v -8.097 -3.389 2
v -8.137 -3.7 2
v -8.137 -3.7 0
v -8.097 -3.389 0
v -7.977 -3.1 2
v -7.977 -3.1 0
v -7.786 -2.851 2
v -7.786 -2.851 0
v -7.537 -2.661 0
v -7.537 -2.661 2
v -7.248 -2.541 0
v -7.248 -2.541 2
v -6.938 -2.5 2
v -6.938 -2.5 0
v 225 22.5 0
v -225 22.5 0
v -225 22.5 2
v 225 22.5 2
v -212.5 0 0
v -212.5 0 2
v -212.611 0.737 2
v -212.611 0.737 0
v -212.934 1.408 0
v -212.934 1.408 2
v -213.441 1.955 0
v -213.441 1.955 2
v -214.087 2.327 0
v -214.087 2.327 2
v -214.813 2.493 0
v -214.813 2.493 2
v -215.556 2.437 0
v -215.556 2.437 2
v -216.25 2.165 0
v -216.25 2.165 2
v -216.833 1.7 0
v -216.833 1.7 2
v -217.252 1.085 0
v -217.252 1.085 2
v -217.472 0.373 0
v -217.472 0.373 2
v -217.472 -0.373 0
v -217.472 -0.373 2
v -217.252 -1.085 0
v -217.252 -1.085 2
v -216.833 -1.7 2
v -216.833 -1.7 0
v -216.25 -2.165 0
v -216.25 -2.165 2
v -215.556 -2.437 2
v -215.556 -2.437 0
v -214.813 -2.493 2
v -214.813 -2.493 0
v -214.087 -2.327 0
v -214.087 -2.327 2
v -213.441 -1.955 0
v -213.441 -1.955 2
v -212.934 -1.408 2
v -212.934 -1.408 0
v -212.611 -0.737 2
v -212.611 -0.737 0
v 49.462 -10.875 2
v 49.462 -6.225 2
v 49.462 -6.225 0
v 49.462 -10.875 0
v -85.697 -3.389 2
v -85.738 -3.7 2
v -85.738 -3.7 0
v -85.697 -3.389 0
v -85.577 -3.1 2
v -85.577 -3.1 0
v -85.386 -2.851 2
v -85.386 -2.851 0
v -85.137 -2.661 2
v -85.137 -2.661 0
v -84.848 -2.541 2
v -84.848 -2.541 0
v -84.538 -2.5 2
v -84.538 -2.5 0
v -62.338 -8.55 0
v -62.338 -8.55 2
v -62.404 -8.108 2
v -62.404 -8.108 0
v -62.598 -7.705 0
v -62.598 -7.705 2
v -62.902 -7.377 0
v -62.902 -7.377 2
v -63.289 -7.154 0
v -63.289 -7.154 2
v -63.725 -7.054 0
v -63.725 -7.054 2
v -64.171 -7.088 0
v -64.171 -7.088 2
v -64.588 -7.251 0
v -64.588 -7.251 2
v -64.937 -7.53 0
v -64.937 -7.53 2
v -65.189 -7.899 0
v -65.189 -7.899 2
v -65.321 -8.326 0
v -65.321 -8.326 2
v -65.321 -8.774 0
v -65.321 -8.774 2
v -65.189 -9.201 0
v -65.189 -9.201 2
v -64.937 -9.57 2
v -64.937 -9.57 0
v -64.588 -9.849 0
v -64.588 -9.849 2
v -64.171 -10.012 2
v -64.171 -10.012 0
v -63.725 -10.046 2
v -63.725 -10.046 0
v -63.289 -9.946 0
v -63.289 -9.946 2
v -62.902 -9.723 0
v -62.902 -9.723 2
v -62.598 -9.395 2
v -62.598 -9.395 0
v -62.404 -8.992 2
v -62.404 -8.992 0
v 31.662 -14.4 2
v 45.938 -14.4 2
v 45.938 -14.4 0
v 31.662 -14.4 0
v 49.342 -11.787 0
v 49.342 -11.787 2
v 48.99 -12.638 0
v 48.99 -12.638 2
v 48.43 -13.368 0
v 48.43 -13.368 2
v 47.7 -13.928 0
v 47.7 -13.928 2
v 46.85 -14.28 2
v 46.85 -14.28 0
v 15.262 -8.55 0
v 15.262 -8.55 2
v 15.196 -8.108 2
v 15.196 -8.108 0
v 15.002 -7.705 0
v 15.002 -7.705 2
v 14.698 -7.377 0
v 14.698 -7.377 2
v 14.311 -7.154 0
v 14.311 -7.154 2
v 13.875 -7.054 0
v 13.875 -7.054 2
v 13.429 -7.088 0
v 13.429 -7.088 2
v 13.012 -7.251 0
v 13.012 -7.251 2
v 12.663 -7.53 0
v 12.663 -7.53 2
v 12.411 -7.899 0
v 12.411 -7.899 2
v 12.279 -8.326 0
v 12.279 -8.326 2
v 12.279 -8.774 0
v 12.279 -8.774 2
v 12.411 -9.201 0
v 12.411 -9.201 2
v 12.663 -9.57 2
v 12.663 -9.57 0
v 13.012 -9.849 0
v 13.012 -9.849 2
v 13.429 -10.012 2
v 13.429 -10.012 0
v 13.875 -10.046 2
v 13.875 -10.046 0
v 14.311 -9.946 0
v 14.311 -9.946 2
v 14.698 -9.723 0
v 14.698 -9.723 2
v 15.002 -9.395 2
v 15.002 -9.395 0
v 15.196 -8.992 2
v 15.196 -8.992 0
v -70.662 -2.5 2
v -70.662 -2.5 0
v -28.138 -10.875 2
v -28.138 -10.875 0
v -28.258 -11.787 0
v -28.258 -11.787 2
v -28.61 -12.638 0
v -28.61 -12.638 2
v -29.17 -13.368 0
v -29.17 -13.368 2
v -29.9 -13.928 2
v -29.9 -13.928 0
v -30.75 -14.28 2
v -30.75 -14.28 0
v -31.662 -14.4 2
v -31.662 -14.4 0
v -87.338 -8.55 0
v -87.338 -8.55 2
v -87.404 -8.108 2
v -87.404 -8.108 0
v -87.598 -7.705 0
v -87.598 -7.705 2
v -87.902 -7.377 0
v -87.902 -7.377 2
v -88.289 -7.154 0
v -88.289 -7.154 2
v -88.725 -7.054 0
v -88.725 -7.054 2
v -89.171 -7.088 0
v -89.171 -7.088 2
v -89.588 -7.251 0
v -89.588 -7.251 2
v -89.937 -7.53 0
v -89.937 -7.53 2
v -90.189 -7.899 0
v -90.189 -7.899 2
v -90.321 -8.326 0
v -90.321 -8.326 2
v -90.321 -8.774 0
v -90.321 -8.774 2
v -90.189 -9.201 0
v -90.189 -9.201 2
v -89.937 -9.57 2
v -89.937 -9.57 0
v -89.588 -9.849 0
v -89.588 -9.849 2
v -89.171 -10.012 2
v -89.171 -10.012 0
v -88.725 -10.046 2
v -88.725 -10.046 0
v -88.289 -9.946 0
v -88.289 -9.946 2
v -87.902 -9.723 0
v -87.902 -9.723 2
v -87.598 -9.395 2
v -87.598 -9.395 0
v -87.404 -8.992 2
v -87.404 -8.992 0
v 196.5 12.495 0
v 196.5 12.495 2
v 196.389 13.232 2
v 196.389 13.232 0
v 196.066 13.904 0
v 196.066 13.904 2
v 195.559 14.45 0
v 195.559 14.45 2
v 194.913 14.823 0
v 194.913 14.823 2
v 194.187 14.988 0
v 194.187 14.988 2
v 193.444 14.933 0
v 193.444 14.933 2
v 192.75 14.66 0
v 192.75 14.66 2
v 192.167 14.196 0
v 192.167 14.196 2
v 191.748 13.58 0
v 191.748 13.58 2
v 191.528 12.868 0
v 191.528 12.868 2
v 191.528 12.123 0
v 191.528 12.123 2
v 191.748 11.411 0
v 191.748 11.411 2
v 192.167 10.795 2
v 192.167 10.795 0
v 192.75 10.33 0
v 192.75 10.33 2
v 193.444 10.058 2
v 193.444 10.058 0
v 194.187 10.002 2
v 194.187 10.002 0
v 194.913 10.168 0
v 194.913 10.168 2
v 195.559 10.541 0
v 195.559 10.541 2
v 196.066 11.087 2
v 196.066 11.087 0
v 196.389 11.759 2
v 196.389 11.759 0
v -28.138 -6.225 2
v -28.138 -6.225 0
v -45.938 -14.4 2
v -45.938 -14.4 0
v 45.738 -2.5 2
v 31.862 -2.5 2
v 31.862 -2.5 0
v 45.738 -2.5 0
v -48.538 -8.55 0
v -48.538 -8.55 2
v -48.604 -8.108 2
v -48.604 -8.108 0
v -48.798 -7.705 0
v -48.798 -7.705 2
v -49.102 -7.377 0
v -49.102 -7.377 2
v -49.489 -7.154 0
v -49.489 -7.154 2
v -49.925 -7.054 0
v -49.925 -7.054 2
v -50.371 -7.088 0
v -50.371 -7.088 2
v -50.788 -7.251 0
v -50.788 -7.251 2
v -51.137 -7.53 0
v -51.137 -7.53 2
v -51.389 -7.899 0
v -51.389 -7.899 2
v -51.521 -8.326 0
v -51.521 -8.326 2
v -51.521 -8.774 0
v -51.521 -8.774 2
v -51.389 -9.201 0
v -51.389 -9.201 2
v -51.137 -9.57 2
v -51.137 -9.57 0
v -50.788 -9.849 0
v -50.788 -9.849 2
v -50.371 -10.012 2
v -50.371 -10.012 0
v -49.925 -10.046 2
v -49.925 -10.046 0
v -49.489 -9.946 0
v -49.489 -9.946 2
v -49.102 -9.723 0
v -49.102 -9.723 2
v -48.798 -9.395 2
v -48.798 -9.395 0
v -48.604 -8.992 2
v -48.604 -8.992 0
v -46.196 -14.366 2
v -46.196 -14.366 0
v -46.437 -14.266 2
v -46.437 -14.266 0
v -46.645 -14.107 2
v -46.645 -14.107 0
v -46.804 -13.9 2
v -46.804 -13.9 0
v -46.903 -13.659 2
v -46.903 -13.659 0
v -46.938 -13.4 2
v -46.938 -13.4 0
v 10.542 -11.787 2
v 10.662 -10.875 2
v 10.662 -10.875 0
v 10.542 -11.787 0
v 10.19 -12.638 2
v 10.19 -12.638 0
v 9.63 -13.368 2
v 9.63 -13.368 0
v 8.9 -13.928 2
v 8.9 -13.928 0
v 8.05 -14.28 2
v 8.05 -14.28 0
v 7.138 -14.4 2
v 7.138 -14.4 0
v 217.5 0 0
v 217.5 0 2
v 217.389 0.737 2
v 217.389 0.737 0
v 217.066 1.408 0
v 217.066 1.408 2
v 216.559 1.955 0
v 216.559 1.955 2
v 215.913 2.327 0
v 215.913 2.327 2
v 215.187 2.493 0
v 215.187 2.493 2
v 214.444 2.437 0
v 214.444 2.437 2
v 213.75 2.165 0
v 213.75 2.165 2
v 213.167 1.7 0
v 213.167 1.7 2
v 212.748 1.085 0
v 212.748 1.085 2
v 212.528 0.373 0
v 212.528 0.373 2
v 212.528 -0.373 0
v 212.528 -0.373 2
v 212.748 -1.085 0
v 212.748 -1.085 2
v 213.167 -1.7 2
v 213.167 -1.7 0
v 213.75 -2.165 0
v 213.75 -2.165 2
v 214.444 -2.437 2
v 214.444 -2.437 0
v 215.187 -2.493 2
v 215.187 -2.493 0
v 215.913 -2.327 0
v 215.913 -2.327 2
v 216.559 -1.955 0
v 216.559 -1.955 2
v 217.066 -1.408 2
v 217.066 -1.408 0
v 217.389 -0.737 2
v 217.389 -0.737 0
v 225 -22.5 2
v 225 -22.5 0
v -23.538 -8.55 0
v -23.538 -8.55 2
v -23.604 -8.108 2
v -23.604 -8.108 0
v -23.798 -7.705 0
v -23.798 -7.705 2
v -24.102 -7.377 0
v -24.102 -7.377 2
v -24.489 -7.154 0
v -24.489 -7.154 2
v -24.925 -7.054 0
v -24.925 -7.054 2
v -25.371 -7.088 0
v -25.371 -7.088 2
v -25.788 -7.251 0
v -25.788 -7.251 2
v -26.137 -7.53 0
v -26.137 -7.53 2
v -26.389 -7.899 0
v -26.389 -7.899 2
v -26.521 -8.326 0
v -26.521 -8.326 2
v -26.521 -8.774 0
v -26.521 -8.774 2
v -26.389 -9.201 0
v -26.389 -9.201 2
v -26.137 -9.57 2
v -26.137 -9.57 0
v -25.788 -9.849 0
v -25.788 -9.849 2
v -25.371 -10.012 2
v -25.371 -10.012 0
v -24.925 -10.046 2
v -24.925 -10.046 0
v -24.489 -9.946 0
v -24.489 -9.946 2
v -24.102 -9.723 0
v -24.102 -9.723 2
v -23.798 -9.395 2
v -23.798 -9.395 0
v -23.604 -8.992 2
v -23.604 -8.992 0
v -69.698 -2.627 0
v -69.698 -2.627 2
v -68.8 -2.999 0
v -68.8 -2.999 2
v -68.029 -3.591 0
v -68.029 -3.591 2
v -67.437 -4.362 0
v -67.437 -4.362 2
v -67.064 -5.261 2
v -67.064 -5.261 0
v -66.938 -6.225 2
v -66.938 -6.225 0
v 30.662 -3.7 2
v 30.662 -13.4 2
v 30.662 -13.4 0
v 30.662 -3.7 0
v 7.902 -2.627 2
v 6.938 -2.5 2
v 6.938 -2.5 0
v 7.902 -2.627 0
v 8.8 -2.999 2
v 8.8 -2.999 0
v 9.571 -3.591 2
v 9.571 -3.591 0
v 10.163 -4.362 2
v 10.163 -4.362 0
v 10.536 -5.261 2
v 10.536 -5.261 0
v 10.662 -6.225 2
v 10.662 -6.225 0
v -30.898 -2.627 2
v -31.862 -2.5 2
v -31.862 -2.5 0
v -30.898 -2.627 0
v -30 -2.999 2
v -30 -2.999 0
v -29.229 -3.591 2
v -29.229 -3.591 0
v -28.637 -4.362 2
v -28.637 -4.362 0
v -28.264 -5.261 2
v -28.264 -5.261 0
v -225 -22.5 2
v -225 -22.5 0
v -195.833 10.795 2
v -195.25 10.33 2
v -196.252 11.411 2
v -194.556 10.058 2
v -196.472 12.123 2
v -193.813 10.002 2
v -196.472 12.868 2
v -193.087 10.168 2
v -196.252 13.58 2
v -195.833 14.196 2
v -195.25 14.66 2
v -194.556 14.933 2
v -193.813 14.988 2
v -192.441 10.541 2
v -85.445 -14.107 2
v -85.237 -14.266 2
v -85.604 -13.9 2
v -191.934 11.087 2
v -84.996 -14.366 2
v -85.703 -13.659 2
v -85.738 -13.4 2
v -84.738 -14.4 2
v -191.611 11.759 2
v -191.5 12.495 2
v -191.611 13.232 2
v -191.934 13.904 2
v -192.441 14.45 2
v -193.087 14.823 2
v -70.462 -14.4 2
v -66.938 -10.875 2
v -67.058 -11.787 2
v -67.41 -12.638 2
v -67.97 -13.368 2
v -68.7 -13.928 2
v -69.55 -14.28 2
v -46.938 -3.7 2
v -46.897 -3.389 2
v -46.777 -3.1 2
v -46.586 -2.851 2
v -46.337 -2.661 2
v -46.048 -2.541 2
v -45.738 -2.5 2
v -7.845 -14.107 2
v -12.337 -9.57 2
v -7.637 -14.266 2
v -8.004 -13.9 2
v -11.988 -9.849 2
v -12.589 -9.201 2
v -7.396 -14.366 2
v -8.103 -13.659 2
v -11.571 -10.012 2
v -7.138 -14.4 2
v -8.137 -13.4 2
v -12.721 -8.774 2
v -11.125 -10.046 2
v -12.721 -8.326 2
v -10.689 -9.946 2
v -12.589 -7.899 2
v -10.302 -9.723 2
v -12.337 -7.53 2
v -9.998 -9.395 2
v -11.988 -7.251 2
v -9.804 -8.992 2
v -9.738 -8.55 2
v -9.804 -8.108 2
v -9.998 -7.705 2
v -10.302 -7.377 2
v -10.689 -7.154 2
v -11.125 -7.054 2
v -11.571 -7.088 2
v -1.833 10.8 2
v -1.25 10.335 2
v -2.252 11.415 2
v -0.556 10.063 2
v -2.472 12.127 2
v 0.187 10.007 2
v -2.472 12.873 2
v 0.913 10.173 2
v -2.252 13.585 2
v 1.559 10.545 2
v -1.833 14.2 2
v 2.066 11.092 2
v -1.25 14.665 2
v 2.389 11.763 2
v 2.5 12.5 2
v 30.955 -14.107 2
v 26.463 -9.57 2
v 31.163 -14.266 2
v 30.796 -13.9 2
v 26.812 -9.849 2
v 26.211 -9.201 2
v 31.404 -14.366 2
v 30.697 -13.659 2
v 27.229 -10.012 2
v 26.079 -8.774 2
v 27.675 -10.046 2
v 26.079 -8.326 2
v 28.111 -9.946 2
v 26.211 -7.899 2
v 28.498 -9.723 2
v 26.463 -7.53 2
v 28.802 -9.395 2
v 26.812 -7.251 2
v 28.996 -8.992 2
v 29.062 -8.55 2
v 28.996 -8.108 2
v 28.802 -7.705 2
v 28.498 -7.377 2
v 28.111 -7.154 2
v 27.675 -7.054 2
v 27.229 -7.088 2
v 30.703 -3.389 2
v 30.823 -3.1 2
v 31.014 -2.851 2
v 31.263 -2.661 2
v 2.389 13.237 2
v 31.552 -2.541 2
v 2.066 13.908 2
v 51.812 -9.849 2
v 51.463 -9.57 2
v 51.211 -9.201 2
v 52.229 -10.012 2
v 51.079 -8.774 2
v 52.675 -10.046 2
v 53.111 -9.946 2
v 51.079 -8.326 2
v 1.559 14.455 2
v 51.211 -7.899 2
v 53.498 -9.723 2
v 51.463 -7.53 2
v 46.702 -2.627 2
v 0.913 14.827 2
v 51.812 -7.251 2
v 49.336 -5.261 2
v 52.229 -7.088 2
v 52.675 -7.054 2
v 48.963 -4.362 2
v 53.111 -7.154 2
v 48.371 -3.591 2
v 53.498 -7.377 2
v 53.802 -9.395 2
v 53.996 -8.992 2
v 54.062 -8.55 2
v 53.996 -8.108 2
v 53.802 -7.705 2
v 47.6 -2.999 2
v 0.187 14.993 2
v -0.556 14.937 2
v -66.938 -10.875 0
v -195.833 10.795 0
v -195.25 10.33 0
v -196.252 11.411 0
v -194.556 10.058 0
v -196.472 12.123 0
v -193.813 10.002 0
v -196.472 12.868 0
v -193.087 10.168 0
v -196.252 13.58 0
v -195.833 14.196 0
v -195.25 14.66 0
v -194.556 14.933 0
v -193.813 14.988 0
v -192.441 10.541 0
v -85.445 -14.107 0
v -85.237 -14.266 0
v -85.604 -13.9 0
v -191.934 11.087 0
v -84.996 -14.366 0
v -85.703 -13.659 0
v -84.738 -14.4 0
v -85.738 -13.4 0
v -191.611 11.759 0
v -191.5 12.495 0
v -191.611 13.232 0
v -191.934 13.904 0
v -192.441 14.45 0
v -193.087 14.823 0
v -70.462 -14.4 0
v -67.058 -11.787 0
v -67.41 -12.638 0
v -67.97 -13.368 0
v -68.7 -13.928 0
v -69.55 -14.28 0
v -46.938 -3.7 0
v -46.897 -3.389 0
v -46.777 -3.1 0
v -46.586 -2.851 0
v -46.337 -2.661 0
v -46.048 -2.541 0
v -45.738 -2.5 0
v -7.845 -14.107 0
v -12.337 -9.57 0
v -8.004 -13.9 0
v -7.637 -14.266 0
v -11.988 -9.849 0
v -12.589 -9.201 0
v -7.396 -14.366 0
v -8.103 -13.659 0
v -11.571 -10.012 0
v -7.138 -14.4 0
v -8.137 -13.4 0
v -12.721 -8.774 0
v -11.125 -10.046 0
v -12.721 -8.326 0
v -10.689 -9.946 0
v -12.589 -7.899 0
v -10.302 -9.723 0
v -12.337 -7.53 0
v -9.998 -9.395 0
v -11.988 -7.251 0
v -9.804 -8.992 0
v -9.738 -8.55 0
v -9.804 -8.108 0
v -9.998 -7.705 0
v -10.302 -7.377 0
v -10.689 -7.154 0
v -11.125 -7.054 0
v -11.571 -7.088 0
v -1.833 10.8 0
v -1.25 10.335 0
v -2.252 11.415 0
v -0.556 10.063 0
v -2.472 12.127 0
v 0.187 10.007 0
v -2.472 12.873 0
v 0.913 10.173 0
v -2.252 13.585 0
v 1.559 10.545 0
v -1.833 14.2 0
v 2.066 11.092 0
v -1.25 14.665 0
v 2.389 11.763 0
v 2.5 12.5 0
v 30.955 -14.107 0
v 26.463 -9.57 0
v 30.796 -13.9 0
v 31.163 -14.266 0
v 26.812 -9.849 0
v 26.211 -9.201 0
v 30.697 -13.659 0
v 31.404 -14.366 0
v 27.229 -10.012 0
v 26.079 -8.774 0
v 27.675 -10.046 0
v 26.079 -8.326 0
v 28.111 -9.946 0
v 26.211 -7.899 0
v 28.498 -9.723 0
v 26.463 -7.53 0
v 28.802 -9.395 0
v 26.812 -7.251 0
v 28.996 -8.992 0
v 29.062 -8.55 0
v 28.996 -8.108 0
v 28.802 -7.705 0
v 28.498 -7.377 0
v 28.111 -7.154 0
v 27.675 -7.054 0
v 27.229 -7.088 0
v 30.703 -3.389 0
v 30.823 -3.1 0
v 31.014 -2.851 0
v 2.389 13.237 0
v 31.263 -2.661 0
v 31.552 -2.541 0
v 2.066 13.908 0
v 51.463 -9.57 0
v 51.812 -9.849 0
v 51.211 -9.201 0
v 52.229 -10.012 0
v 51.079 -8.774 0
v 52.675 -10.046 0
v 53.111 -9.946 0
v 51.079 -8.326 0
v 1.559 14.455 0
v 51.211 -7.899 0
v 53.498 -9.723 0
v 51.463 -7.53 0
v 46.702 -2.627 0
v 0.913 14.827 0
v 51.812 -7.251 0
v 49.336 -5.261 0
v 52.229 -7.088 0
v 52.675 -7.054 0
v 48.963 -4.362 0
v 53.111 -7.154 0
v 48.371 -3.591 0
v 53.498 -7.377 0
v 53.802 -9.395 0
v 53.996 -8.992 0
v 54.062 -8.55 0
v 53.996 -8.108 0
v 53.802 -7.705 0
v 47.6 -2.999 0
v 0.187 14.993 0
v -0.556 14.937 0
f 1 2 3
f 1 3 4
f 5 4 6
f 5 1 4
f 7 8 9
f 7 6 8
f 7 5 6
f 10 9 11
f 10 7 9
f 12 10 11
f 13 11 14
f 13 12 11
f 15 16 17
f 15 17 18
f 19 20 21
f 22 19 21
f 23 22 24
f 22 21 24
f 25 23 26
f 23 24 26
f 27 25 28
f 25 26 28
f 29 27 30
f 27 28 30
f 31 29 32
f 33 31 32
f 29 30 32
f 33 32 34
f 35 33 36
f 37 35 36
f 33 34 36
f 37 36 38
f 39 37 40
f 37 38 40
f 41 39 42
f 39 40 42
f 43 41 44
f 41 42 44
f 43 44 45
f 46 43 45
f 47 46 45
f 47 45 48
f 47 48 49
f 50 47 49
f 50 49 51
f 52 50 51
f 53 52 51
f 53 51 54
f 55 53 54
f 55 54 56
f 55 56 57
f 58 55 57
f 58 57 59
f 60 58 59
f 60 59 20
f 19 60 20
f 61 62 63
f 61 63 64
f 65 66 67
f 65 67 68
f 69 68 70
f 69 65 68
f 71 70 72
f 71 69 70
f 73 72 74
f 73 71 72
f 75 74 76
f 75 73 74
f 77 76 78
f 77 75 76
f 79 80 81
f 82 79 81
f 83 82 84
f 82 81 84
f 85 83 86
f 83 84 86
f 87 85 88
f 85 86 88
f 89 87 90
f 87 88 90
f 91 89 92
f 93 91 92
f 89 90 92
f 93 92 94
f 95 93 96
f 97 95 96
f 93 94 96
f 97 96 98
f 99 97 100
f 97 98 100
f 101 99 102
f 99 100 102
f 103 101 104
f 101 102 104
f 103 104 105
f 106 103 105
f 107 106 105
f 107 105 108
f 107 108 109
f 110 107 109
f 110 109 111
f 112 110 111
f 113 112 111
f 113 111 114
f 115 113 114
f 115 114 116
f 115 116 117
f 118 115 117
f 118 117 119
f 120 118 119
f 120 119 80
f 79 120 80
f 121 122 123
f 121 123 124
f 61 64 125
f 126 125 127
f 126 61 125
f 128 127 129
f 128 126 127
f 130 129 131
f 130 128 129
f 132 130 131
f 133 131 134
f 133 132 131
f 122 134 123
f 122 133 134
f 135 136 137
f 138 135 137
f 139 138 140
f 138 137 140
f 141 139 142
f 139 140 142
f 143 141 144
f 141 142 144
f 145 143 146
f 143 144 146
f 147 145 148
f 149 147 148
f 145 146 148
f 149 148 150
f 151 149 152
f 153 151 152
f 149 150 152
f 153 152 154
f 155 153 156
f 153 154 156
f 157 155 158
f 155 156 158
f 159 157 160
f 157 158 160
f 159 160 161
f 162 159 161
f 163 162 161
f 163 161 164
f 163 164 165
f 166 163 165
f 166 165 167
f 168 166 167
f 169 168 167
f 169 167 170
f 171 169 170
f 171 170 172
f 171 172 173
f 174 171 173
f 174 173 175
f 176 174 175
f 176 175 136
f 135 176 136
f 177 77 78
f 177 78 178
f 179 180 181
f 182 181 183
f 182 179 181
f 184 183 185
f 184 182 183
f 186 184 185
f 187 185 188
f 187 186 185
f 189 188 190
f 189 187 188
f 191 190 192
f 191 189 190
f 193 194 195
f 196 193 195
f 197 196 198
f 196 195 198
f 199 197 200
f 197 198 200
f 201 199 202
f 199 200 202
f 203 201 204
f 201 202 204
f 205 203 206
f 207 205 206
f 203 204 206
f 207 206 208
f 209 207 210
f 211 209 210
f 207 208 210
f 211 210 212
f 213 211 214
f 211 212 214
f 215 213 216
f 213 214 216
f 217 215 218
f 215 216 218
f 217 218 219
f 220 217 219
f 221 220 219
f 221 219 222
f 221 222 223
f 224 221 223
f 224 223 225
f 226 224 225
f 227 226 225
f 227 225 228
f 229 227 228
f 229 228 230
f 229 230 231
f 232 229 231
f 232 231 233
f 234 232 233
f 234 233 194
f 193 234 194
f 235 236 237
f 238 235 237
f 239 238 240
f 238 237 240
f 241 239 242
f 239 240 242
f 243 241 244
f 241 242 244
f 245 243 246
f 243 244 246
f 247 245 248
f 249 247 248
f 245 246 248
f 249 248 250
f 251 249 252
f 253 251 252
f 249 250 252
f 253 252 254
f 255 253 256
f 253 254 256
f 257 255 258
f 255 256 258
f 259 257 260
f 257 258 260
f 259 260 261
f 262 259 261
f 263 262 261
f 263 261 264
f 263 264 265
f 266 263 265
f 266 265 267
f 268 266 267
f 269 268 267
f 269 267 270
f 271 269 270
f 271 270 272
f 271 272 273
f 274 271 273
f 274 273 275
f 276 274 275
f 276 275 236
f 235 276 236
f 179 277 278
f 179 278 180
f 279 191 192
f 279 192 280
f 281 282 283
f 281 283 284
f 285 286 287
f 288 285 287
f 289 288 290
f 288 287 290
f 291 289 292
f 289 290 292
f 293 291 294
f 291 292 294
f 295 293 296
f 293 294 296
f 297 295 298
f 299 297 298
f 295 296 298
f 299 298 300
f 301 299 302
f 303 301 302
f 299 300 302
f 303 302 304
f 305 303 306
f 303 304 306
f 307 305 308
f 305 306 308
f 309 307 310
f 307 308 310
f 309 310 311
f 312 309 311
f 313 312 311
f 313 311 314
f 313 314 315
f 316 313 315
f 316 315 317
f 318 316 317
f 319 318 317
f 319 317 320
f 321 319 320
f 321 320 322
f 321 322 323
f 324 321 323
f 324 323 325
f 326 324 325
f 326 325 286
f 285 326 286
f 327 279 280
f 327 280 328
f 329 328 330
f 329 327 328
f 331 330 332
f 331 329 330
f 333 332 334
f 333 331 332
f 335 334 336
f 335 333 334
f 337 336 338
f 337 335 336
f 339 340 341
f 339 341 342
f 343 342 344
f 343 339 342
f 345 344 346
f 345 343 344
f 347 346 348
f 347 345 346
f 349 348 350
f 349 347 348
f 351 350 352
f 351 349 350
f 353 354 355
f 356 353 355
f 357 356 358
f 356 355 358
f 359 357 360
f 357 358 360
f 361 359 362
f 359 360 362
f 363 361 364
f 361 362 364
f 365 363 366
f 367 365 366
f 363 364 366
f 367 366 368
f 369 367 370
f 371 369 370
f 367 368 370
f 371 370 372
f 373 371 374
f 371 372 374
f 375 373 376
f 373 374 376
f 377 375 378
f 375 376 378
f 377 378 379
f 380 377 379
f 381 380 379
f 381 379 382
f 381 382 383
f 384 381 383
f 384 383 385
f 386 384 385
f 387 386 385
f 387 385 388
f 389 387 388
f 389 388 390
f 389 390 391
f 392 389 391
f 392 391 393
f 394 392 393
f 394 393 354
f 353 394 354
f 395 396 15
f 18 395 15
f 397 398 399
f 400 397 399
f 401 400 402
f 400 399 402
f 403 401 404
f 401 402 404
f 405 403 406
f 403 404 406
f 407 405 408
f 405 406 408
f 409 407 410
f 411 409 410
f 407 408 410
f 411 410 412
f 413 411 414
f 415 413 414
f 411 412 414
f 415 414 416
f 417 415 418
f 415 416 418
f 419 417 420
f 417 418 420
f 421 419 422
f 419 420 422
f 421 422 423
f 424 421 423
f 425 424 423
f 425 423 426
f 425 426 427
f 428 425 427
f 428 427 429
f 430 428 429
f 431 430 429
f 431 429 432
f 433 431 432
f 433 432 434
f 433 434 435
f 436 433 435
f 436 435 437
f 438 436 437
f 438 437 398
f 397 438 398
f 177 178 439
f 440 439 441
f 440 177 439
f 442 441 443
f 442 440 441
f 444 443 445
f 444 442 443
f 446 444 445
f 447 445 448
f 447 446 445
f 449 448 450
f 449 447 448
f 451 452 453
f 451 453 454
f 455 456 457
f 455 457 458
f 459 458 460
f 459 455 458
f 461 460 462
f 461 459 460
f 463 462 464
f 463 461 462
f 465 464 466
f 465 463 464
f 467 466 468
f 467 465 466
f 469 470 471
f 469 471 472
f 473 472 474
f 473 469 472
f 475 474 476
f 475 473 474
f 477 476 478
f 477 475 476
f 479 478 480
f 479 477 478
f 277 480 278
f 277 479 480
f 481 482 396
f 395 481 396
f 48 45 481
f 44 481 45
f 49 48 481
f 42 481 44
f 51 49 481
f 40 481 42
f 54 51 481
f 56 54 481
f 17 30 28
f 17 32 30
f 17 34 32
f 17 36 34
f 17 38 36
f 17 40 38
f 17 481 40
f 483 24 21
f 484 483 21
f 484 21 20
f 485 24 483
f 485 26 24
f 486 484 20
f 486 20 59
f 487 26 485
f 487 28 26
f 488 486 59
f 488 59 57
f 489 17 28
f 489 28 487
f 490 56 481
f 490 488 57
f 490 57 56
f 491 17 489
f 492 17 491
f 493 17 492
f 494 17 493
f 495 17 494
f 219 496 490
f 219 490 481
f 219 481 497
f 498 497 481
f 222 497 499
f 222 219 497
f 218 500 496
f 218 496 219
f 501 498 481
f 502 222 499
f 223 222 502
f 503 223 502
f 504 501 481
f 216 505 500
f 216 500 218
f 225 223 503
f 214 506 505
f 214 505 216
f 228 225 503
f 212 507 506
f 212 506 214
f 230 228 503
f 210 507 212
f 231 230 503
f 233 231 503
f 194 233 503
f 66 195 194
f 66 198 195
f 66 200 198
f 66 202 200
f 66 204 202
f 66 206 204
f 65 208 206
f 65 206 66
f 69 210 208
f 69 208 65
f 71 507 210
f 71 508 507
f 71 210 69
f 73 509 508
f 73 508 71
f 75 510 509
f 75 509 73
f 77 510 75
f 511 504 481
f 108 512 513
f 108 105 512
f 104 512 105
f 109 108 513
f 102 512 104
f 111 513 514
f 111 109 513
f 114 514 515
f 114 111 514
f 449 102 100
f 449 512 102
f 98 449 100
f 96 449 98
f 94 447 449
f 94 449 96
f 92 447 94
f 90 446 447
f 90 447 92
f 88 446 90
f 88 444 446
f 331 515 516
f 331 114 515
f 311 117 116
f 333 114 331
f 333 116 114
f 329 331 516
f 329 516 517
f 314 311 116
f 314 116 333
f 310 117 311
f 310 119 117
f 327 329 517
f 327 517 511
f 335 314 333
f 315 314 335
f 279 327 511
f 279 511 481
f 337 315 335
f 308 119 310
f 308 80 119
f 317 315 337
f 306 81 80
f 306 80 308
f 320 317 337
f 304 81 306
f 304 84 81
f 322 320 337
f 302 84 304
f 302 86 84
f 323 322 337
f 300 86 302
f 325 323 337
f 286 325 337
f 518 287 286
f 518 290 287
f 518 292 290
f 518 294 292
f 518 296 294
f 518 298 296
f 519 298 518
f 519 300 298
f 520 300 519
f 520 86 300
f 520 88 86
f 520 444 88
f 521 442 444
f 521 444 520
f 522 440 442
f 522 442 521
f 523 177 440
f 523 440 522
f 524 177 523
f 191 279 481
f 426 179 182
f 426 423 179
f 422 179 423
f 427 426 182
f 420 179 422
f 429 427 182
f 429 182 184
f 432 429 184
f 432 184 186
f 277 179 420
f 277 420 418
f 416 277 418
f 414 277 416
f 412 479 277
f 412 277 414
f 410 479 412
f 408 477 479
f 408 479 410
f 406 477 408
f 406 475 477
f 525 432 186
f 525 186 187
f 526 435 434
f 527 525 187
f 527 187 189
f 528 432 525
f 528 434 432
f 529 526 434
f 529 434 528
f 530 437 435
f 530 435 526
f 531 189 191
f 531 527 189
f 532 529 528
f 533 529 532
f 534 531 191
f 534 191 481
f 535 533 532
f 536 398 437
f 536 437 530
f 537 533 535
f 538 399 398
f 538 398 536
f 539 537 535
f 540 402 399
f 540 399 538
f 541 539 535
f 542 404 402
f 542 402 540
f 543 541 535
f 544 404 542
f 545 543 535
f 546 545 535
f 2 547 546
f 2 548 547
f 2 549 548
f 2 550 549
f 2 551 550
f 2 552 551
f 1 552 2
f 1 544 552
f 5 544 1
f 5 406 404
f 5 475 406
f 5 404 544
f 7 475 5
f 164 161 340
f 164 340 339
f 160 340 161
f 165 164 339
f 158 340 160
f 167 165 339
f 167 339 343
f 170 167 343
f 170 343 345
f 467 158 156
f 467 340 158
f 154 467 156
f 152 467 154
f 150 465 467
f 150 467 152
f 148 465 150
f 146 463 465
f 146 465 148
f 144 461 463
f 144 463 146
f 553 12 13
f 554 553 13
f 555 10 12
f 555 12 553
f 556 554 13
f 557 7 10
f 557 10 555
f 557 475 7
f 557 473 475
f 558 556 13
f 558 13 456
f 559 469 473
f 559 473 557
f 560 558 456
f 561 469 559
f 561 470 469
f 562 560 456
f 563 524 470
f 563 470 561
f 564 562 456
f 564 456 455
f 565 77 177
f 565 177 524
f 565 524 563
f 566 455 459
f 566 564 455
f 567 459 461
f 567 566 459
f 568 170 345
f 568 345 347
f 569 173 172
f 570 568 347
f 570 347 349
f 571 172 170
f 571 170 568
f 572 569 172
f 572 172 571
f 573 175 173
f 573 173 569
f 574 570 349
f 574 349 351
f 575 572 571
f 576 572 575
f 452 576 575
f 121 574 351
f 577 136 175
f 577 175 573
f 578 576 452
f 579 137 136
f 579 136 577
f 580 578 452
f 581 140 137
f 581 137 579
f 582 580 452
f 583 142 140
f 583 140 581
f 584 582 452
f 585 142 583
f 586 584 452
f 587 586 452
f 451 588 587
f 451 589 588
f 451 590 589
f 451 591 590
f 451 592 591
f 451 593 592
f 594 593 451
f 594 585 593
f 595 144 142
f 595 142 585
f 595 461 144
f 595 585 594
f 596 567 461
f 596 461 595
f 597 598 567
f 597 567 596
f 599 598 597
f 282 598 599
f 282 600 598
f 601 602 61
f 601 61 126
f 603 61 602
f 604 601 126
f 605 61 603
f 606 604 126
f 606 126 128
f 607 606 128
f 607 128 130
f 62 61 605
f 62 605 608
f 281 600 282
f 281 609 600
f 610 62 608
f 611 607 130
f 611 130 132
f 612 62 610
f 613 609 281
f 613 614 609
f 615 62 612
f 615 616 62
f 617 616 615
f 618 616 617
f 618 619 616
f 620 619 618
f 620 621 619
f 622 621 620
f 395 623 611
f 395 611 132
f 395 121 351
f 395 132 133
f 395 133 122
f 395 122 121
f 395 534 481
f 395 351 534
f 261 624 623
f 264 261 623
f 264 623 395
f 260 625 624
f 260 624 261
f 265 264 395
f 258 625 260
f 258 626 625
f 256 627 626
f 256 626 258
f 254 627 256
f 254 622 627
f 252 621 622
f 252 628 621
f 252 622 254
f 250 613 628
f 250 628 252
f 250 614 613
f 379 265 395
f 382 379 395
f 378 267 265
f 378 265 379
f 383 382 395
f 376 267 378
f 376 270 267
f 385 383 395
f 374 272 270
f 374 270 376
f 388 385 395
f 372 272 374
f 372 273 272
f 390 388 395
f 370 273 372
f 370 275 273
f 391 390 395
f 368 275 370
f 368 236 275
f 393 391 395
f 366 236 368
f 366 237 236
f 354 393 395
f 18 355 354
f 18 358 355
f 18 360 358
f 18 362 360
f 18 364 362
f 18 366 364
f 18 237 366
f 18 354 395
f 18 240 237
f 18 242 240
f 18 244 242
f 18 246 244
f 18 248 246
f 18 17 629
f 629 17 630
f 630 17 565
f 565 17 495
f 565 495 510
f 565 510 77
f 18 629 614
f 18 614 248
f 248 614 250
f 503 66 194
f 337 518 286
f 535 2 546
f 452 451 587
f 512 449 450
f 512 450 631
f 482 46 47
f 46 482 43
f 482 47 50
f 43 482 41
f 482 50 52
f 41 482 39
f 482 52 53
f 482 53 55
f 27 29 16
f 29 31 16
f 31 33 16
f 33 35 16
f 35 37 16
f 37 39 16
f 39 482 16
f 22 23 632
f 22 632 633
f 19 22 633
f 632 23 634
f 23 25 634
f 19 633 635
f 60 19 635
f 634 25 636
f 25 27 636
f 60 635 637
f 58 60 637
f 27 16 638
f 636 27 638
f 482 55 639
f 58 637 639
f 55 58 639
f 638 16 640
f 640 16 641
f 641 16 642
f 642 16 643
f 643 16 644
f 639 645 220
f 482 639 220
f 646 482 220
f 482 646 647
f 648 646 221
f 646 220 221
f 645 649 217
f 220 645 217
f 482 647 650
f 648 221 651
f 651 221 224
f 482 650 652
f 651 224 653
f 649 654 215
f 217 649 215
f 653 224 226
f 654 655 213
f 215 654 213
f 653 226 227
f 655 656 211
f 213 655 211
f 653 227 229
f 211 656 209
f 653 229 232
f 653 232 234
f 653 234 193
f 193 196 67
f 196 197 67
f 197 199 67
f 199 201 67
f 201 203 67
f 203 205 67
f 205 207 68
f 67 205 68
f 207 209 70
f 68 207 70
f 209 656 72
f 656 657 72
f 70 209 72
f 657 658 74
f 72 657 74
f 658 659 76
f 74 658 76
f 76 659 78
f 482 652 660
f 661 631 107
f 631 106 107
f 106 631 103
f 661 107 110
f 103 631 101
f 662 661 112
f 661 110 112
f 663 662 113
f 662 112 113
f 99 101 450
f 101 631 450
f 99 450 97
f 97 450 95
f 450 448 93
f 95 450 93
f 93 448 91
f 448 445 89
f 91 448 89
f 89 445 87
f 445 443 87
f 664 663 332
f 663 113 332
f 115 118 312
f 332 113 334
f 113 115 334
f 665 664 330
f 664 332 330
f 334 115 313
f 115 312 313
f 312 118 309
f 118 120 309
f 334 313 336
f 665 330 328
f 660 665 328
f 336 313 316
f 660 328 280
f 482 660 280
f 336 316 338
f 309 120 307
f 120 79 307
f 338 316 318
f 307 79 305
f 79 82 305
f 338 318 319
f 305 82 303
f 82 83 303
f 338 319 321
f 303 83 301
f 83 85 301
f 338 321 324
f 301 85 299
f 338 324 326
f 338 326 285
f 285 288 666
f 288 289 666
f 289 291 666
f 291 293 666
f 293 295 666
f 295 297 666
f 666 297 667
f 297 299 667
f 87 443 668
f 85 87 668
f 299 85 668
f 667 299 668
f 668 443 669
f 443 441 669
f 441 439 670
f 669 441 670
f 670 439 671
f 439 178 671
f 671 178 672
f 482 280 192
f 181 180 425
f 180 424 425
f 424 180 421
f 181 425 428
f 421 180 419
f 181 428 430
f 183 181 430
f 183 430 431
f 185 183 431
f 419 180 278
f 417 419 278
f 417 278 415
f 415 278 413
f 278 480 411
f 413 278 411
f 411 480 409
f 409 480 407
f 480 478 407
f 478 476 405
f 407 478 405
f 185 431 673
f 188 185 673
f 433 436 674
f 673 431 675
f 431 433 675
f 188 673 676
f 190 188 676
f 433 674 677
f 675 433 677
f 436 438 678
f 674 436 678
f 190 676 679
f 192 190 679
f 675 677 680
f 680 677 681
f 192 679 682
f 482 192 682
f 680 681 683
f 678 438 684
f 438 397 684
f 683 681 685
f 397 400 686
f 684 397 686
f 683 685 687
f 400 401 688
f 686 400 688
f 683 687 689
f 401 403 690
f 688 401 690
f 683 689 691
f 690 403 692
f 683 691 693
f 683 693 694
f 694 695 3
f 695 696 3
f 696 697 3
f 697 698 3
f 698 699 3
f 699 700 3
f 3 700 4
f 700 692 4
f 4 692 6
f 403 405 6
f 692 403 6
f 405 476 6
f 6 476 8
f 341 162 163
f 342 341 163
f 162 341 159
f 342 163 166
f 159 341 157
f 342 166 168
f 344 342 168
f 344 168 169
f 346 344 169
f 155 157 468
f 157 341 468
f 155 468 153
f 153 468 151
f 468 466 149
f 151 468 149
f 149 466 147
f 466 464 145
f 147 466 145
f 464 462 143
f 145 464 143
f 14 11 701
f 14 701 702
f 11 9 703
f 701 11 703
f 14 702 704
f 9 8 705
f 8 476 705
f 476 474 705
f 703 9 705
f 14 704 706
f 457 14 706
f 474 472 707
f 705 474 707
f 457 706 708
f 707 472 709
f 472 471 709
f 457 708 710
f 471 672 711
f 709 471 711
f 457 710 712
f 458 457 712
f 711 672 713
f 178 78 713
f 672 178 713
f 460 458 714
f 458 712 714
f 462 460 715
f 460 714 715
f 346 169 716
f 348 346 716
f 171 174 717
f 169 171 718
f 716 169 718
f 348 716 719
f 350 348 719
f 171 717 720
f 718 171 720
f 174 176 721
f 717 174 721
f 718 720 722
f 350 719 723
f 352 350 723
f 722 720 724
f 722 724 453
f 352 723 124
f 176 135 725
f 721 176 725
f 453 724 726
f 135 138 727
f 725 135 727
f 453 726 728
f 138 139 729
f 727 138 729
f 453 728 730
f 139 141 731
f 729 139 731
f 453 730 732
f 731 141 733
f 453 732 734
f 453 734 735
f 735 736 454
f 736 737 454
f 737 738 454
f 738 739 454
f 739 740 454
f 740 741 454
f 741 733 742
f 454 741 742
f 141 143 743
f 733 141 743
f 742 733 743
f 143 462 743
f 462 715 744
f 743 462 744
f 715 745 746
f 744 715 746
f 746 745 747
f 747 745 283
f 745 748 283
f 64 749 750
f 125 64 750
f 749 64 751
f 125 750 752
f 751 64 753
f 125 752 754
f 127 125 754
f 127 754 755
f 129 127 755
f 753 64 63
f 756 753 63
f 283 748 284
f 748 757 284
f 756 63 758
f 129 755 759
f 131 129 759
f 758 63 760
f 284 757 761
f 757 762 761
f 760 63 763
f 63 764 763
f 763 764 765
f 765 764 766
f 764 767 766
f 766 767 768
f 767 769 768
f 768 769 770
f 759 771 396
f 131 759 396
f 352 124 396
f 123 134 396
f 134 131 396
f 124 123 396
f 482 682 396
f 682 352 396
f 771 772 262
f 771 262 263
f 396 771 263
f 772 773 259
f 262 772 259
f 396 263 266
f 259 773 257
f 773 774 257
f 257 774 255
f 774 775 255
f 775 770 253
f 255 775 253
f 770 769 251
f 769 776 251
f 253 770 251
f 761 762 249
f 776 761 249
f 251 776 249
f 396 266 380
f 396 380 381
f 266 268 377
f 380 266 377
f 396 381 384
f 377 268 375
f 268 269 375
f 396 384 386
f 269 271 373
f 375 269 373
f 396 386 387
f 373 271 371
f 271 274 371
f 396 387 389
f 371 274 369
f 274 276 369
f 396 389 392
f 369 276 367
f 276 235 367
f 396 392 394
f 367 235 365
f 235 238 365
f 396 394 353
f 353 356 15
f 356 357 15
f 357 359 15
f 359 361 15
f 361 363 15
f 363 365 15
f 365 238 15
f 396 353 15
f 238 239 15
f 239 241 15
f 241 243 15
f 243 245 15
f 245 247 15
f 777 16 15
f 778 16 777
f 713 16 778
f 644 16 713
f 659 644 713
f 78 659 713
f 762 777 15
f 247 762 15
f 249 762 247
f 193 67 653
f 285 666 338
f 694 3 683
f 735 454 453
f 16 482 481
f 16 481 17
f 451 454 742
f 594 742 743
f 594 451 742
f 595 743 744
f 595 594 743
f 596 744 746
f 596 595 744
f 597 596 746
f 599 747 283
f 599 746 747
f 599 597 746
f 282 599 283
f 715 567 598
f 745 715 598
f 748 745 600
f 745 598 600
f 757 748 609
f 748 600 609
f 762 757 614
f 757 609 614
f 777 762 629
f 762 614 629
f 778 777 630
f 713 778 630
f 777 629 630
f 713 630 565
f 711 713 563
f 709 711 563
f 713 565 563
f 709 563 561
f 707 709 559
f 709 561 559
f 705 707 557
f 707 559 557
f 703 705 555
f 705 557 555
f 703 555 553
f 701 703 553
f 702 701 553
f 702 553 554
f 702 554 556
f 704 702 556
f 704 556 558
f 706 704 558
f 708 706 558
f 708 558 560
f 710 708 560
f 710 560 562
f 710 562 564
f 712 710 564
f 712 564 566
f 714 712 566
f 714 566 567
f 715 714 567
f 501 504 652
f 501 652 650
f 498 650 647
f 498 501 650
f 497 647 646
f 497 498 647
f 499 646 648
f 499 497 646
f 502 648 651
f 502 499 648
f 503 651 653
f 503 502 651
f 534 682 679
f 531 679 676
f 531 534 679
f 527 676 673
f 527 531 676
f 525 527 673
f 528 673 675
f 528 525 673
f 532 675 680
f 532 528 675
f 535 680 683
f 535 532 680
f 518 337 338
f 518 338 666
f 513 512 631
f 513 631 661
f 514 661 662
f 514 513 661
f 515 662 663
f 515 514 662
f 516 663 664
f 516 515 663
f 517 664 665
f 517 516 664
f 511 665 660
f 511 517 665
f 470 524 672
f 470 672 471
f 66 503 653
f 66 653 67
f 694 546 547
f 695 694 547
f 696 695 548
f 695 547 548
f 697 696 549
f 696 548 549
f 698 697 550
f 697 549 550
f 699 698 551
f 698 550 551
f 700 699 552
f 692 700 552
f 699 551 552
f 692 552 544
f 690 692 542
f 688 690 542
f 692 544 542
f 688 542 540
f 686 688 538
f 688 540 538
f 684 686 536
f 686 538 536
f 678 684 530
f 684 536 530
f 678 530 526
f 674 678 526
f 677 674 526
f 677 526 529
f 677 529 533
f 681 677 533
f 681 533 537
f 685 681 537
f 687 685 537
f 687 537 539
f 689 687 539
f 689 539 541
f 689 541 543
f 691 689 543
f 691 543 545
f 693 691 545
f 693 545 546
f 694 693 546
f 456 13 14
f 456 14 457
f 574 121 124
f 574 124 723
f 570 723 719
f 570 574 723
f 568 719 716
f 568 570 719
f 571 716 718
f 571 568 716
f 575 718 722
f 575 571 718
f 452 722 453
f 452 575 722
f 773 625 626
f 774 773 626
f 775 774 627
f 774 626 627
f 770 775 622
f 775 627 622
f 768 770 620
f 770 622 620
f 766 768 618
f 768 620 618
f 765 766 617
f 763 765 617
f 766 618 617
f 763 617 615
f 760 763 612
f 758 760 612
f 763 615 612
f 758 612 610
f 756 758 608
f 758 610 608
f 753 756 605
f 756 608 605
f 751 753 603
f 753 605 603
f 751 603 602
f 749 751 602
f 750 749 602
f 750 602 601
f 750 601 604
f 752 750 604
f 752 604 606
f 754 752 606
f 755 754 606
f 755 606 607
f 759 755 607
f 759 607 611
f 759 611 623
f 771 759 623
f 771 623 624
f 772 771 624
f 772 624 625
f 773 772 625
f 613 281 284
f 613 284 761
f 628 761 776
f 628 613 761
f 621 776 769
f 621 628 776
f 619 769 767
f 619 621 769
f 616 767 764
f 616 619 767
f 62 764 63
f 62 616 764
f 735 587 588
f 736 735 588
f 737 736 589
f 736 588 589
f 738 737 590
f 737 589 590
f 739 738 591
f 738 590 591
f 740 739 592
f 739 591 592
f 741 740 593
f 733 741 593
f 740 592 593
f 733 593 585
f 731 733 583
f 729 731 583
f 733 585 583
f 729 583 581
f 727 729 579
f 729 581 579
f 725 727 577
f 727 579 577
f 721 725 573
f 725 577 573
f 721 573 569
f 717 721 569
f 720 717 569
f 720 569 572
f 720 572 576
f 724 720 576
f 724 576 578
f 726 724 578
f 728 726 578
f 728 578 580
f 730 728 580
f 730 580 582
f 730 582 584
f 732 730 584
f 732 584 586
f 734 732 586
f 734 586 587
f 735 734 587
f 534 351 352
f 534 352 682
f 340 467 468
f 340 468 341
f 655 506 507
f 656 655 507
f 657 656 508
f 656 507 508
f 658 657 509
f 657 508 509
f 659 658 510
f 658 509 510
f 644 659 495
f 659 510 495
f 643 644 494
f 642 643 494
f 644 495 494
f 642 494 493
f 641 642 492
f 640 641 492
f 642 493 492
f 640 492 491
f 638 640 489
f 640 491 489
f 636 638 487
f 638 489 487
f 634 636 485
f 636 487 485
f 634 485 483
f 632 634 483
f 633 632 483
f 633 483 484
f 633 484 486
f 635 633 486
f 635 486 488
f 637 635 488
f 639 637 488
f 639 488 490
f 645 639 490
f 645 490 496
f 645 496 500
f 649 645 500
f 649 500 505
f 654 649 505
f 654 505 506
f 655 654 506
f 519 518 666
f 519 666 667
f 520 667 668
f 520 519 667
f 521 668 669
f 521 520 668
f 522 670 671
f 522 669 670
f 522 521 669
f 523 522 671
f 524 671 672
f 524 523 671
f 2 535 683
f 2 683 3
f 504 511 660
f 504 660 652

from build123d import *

# Parameters (mm, degrees)
SKETCH1_W           = 450
SKETCH1_H           = 45
BOSS_EXTRUDE1_DEPTH = 2
SKETCH2_R           = 1.5
CUT_EXTRUDE1_DEPTH  = 227.131046077
SKETCH3_R           = 2.5
CUT_EXTRUDE2_DEPTH  = 227.131046077


with BuildPart() as part:
    # Sketch1 → Boss-Extrude1 (new body)
    with BuildSketch(Plane.XY):
        Rectangle(SKETCH1_W, SKETCH1_H)
    extrude(amount=BOSS_EXTRUDE1_DEPTH)

    # Sketch2 → Cut-Extrude1 (cut, through all)
    with BuildSketch(Plane.XY.offset(2)):
        with Locations((-50.0375, -8.55)):
            Circle(SKETCH2_R)
        with Locations((-25.0375, -8.55)):
            Circle(SKETCH2_R)
        with Locations((-11.2375, -8.55)):
            Circle(SKETCH2_R)
        with Locations((13.7625, -8.55)):
            Circle(SKETCH2_R)
        with Locations((27.5625, -8.55)):
            Circle(SKETCH2_R)
        with Locations((52.5625, -8.55)):
            Circle(SKETCH2_R)
        with Locations((-88.8375, -8.55)):
            Circle(SKETCH2_R)
        with Locations((-63.8375, -8.55)):
            Circle(SKETCH2_R)
        with BuildLine():
            Line((-31.6625, -14.4), (-45.9375, -14.4))
            ThreePointArc((-45.9375, -14.4), (-46.644606781, -14.107106781), (-46.9375, -13.4))
            Line((-46.9375, -13.4), (-46.9375, -3.7))
            ThreePointArc((-46.9375, -3.7), (-46.586028137, -2.851471863), (-45.7375, -2.5))
            Line((-45.7375, -2.5), (-31.8625, -2.5))
            ThreePointArc((-31.8625, -2.5), (-29.22852724, -3.59102724), (-28.1375, -6.225))
            Line((-28.1375, -6.225), (-28.1375, -10.875))
            ThreePointArc((-28.1375, -10.875), (-29.169948596, -13.367551404), (-31.6625, -14.4))
        make_face()
        with BuildLine():
            Line((7.1375, -14.4), (-7.1375, -14.4))
            ThreePointArc((-7.1375, -14.4), (-7.844606781, -14.107106781), (-8.1375, -13.4))
            Line((-8.1375, -13.4), (-8.1375, -3.7))
            ThreePointArc((-8.1375, -3.7), (-7.786028137, -2.851471863), (-6.9375, -2.5))
            Line((-6.9375, -2.5), (6.9375, -2.5))
            ThreePointArc((6.9375, -2.5), (9.57147276, -3.59102724), (10.6625, -6.225))
            Line((10.6625, -6.225), (10.6625, -10.875))
            ThreePointArc((10.6625, -10.875), (9.630051404, -13.367551404), (7.1375, -14.4))
        make_face()
        with BuildLine():
            Line((45.9375, -14.4), (31.6625, -14.4))
            ThreePointArc((31.6625, -14.4), (30.955393219, -14.107106781), (30.6625, -13.4))
            Line((30.6625, -13.4), (30.6625, -3.7))
            ThreePointArc((30.6625, -3.7), (31.013971863, -2.851471863), (31.8625, -2.5))
            Line((31.8625, -2.5), (45.7375, -2.5))
            ThreePointArc((45.7375, -2.5), (48.37147276, -3.59102724), (49.4625, -6.225))
            Line((49.4625, -6.225), (49.4625, -10.875))
            ThreePointArc((49.4625, -10.875), (48.430051404, -13.367551404), (45.9375, -14.4))
        make_face()
        with BuildLine():
            Line((-70.4625, -14.4), (-84.7375, -14.4))
            ThreePointArc((-84.7375, -14.4), (-85.444606781, -14.107106781), (-85.7375, -13.4))
            Line((-85.7375, -13.4), (-85.7375, -3.7))
            ThreePointArc((-85.7375, -3.7), (-85.386028137, -2.851471863), (-84.5375, -2.5))
            Line((-84.5375, -2.5), (-70.6625, -2.5))
            ThreePointArc((-70.6625, -2.5), (-68.02852724, -3.59102724), (-66.9375, -6.225))
            Line((-66.9375, -6.225), (-66.9375, -10.875))
            ThreePointArc((-66.9375, -10.875), (-67.969948596, -13.367551404), (-70.4625, -14.4))
        make_face()
    extrude(amount=-CUT_EXTRUDE1_DEPTH, mode=Mode.SUBTRACT)

    # Sketch3 → Cut-Extrude2 (cut, through all)
    with BuildSketch(Plane.XY.offset(2)):
        with Locations((-215, 0)):
            Circle(SKETCH3_R)
        with Locations((215, 0)):
            Circle(SKETCH3_R)
        with Locations((-194, 12.495407459)):
            Circle(SKETCH3_R)
        with Locations((194, 12.495407459)):
            Circle(SKETCH3_R)
        with Locations((0, 12.5)):
            Circle(SKETCH3_R)
    extrude(amount=-CUT_EXTRUDE2_DEPTH, mode=Mode.SUBTRACT)


solid = part.part
